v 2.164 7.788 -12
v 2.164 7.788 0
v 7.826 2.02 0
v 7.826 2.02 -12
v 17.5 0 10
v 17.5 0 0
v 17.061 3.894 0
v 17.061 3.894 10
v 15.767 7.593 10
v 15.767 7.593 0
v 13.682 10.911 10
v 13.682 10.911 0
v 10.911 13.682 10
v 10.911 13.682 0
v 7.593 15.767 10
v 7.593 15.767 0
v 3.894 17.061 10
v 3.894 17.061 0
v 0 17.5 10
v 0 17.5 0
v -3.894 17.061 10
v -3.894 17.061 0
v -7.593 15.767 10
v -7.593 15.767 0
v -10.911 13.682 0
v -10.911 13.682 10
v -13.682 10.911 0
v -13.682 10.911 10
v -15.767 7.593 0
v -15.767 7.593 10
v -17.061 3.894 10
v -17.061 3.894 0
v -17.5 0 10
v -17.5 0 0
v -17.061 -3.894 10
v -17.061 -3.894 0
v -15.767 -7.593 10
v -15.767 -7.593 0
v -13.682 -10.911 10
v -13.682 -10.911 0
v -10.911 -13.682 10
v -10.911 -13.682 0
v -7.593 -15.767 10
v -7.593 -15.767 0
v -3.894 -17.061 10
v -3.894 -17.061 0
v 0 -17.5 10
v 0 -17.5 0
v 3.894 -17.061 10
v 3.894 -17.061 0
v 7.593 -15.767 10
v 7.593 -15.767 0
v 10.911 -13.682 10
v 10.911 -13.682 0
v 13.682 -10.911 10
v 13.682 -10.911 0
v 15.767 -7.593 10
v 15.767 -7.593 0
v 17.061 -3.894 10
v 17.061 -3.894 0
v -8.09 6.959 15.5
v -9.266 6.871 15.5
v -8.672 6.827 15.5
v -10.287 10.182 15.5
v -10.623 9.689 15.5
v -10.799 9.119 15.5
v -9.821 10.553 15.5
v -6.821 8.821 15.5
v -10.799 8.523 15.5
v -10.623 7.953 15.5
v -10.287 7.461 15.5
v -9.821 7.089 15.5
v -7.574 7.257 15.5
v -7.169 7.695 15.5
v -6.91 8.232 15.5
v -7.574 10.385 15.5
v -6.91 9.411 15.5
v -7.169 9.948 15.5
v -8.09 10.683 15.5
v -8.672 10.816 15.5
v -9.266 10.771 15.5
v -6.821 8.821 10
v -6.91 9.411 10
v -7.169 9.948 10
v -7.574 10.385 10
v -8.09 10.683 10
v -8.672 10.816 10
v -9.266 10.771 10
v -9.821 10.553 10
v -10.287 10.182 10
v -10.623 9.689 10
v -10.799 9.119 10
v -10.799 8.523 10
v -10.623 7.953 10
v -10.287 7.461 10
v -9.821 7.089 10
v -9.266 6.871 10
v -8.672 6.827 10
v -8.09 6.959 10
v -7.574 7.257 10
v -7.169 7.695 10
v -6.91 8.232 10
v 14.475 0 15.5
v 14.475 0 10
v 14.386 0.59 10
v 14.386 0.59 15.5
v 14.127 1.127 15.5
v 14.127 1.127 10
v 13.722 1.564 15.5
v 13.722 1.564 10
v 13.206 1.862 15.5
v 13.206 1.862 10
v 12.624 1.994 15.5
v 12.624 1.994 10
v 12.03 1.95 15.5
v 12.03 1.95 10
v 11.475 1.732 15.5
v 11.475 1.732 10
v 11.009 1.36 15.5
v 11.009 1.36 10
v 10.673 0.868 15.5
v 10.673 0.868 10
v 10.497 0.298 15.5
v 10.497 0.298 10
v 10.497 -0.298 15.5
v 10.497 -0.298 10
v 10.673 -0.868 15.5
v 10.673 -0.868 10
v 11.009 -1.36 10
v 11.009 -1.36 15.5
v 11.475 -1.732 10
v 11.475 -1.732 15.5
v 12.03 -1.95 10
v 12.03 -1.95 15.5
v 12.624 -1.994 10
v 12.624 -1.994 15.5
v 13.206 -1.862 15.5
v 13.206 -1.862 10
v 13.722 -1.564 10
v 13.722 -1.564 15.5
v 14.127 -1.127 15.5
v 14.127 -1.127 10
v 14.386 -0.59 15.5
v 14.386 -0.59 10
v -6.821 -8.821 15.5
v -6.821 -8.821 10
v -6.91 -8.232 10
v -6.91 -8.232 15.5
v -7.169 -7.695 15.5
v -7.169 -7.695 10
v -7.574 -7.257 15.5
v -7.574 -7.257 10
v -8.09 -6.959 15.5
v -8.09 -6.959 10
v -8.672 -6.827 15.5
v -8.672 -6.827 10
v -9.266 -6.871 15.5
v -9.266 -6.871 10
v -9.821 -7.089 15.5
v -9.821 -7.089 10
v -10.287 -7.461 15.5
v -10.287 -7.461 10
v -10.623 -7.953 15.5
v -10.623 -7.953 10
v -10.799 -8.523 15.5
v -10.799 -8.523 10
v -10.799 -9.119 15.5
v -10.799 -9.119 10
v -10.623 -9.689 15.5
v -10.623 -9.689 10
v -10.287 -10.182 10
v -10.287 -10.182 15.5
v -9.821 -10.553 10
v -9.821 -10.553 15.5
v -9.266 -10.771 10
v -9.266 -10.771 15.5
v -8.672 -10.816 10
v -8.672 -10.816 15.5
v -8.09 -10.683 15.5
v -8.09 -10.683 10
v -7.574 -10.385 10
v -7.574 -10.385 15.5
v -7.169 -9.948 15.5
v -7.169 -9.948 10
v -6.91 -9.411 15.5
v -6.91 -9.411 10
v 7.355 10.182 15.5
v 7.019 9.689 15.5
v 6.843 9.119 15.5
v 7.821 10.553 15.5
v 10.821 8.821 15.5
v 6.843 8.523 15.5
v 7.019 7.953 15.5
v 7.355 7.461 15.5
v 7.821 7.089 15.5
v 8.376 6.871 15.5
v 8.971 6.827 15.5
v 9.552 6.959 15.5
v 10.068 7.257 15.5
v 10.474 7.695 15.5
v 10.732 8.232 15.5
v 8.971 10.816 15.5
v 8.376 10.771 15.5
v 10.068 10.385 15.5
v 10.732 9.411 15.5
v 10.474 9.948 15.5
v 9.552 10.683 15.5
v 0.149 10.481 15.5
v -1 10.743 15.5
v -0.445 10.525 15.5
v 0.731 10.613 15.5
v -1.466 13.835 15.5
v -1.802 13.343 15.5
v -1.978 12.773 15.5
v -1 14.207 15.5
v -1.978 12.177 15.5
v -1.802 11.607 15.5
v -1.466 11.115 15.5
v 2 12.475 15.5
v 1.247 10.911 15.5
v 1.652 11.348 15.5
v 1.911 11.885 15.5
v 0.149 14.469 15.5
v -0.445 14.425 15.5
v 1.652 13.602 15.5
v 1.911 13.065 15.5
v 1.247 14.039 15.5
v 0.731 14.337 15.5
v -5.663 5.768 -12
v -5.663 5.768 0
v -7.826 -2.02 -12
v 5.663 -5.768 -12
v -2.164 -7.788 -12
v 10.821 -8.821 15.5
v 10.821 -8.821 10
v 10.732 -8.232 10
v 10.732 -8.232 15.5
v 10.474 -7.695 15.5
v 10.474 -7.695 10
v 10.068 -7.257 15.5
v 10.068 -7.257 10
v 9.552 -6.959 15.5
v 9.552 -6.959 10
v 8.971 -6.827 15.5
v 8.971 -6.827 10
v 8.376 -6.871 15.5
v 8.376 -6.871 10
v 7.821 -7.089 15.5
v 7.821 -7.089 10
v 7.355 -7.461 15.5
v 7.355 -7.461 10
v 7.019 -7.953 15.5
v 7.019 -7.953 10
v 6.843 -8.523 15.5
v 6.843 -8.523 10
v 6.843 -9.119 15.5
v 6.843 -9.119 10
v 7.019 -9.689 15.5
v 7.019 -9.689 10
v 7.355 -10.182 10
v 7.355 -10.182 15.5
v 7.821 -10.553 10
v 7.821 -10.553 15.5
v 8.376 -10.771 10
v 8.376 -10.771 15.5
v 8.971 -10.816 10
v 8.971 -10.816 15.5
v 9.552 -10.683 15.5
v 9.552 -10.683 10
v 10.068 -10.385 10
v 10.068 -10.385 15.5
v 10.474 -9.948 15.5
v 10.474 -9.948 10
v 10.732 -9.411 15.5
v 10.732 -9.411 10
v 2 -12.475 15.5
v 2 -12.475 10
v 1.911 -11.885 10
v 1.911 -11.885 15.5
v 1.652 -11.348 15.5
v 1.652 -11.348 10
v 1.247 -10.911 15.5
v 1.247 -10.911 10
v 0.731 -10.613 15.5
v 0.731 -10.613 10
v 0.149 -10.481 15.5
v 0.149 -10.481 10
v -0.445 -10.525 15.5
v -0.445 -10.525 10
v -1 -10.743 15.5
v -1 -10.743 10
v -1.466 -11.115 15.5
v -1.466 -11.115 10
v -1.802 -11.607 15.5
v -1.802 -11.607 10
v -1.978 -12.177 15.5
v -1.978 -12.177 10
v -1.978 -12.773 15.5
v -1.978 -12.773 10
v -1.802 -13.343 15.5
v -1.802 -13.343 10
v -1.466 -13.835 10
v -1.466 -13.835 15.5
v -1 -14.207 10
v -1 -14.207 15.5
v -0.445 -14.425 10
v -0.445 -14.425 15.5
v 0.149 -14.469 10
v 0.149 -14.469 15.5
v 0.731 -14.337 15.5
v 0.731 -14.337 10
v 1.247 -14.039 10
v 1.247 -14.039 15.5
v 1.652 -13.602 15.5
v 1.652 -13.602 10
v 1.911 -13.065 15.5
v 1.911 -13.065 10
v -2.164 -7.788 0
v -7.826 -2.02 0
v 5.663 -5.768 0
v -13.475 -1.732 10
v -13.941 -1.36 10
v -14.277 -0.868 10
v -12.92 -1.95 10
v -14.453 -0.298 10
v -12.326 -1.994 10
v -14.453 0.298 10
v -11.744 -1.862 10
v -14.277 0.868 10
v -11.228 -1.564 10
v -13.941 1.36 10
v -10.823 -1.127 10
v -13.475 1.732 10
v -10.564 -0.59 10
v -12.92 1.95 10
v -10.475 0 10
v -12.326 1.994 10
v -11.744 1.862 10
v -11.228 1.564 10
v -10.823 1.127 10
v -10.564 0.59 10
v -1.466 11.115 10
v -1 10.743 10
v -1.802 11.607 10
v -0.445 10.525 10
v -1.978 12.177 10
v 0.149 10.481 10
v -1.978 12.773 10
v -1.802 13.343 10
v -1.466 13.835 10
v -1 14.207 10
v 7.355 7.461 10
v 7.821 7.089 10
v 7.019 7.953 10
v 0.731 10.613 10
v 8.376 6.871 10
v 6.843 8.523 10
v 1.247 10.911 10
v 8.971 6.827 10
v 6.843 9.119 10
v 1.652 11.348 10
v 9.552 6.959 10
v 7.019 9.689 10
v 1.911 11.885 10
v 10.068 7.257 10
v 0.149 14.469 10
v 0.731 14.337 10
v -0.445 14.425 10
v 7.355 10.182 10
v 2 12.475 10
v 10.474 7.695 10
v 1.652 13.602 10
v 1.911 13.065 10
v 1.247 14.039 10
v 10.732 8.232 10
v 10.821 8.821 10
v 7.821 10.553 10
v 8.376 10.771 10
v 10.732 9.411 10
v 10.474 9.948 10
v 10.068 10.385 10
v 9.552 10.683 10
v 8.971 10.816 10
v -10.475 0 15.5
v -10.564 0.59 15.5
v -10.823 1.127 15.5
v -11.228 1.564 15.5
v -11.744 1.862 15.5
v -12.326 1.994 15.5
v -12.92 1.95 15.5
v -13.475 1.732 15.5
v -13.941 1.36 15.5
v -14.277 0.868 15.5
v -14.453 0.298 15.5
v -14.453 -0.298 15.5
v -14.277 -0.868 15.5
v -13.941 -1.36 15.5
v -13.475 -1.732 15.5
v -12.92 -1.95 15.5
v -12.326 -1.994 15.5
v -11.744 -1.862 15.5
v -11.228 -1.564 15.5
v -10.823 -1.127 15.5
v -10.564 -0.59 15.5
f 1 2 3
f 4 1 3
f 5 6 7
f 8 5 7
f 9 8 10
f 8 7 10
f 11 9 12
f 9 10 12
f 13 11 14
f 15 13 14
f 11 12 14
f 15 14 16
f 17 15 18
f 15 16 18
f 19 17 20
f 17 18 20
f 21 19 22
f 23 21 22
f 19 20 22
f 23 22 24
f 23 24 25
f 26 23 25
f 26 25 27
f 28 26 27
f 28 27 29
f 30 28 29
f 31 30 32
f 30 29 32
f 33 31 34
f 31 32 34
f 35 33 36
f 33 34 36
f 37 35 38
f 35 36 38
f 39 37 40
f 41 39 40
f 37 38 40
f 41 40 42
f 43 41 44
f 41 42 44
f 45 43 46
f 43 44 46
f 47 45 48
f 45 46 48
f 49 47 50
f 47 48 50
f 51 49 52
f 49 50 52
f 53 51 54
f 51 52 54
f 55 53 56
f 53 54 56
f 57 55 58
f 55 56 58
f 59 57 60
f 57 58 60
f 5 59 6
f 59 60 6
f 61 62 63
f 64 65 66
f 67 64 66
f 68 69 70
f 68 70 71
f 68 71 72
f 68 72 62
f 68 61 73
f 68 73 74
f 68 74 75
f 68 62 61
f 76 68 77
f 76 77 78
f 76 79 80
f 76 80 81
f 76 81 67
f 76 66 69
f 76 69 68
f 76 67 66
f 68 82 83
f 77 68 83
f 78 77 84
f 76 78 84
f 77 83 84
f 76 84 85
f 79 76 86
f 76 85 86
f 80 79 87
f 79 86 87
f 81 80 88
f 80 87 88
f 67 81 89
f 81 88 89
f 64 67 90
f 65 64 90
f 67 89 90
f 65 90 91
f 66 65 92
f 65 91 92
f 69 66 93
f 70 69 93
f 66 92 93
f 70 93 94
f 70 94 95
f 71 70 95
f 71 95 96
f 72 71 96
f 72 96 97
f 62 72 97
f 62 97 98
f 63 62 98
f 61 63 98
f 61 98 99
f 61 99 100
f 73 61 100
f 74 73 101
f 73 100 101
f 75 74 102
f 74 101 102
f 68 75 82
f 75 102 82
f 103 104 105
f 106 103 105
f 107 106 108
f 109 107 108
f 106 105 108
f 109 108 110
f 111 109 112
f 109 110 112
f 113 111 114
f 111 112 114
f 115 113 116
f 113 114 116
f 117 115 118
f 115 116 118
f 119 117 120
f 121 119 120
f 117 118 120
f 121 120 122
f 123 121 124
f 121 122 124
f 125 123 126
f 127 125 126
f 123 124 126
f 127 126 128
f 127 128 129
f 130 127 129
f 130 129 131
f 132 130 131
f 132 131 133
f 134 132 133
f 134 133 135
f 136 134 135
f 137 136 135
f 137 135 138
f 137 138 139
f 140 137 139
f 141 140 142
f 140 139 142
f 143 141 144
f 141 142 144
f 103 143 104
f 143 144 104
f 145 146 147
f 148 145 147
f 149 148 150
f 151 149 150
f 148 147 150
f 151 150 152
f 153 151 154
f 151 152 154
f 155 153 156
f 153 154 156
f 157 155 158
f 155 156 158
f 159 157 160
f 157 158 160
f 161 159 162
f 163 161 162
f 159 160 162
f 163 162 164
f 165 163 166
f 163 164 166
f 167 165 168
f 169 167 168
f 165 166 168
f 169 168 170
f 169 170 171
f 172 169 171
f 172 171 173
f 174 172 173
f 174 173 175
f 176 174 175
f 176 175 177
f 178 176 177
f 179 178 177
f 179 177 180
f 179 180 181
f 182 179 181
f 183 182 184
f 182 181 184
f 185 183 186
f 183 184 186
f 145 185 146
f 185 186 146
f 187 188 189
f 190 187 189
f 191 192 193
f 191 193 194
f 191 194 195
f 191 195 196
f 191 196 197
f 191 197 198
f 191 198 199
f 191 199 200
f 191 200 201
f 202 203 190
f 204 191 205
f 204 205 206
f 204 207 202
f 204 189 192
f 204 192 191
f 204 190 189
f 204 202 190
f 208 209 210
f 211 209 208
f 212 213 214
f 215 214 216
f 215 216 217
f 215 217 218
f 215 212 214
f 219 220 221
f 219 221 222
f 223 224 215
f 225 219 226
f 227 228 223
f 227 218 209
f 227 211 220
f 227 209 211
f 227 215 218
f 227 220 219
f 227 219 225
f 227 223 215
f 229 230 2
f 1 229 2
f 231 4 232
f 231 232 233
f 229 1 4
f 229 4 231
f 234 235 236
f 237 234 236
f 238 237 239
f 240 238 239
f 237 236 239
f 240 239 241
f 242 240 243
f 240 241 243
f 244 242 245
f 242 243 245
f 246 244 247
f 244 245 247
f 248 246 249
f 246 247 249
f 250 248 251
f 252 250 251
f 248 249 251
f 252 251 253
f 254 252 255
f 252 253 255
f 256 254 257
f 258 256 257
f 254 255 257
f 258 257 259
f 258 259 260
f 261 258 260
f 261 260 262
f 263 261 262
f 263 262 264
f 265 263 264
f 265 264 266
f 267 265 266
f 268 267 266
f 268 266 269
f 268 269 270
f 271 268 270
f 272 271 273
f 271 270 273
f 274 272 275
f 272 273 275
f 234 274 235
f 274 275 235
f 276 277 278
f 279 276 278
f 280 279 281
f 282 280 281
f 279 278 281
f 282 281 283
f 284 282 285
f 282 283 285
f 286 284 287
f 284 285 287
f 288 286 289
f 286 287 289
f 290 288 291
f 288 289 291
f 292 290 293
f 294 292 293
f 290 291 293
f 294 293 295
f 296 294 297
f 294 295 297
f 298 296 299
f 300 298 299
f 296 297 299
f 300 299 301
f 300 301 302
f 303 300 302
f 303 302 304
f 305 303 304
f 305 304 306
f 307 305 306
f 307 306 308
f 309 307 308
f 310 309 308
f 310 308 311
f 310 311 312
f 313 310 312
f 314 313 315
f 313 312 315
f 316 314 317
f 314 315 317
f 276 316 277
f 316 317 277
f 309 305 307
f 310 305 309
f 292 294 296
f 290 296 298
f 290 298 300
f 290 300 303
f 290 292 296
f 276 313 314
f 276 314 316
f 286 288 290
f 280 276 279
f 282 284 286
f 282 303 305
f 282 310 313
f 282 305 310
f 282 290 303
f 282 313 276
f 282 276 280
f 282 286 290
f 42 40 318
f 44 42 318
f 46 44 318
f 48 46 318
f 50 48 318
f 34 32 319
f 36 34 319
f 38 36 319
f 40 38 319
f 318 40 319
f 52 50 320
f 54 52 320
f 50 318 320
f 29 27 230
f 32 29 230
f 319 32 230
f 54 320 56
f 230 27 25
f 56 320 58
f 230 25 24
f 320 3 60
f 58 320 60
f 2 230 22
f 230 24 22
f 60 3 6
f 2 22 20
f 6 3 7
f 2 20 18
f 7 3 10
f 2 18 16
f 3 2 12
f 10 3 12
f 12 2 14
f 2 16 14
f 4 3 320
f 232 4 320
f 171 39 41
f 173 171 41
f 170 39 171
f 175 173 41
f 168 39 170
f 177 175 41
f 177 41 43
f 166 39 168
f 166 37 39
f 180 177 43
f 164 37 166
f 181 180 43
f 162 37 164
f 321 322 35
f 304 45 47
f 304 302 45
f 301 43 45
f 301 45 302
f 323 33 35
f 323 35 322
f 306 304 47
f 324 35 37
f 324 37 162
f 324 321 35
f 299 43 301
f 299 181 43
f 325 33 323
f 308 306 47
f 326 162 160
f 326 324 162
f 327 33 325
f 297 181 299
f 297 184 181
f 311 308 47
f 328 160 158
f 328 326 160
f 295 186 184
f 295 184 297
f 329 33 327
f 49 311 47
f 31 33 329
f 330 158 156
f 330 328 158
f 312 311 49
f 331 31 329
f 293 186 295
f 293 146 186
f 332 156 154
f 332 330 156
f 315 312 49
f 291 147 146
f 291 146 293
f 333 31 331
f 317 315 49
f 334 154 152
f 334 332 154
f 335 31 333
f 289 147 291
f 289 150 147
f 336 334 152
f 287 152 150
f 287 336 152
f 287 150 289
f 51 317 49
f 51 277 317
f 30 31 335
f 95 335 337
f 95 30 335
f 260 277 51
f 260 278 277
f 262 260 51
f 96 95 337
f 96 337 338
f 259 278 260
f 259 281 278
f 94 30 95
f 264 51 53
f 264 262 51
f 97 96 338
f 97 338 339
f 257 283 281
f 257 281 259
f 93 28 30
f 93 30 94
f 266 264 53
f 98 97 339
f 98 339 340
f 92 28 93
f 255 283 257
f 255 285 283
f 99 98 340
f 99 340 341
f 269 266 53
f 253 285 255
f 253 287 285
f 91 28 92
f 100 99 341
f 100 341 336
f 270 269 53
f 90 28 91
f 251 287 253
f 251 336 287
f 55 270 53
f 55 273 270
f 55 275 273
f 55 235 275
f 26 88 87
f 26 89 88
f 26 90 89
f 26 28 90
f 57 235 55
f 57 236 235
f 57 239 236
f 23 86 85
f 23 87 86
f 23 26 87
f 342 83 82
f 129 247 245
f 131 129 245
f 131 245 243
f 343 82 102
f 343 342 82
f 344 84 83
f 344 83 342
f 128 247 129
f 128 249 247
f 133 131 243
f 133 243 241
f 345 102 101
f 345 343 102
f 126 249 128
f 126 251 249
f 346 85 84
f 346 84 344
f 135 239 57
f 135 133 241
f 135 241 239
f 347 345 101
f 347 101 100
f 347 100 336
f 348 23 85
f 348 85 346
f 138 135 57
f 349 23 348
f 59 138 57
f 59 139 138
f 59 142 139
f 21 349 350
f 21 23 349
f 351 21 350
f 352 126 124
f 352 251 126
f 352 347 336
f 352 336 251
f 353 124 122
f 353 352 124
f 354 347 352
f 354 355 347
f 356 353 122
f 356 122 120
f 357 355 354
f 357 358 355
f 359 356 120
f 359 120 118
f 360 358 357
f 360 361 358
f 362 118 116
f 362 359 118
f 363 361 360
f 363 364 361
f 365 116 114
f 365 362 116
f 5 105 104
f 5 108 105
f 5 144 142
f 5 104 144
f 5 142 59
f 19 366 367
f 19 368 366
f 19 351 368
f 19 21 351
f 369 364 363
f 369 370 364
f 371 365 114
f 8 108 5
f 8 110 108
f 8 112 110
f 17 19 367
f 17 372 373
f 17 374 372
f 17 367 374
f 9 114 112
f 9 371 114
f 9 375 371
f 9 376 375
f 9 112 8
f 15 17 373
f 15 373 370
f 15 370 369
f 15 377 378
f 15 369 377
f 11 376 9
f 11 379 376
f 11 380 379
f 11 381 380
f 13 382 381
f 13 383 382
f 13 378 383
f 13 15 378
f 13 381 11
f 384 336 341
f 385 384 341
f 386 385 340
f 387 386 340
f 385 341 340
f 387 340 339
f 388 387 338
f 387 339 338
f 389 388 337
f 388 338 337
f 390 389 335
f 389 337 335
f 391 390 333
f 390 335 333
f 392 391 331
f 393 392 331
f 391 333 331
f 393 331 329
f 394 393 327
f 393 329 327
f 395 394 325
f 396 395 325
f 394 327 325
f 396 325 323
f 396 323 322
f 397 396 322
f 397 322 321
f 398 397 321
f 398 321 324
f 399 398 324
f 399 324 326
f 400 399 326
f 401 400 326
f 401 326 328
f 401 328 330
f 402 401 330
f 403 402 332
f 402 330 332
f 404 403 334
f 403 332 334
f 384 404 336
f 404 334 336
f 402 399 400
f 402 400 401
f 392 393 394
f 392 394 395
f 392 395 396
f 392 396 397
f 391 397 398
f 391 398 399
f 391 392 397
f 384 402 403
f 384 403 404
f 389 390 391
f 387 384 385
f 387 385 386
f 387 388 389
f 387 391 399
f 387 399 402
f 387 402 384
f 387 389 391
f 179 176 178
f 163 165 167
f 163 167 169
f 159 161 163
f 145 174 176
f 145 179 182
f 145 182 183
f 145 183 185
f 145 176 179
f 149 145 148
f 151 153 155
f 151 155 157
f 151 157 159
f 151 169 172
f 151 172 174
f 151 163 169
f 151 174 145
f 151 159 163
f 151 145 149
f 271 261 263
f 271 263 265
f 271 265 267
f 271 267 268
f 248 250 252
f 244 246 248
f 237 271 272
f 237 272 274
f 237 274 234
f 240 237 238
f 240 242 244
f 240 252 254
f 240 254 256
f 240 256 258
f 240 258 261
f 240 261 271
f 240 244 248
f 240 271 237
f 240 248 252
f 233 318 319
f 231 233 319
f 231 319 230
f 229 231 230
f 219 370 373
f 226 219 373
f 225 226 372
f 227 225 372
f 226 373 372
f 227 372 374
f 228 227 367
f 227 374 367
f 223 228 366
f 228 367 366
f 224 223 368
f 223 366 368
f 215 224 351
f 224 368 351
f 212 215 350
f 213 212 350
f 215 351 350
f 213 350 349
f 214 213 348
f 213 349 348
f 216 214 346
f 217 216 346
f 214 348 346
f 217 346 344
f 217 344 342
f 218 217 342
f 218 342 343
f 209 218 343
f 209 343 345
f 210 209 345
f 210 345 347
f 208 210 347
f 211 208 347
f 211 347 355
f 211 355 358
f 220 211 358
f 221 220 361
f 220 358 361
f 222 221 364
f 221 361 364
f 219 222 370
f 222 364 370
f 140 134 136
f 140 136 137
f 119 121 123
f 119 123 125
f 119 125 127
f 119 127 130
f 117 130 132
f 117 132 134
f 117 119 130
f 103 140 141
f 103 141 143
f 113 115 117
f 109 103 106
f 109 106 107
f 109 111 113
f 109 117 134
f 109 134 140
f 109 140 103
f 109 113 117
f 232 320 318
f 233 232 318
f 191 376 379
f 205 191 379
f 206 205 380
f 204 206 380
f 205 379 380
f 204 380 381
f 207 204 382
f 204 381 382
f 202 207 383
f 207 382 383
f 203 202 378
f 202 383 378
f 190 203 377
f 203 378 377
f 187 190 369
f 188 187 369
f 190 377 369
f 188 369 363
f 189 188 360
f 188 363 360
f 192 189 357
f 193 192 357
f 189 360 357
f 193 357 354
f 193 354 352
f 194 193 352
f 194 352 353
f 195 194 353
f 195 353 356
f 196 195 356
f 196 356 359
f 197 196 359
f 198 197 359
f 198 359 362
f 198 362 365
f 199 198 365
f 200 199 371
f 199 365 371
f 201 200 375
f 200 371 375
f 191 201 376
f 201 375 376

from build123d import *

# Parameters (mm, degrees)
ESQUISSE1_R        = 17.5
BOSS_EXTRU_1_DEPTH = 10
ESQUISSE2_R        = 2
BOSS_EXTRU_2_DEPTH = 5.5
BOSS_EXTRU_3_DEPTH = 12


with BuildPart() as part:
    # Esquisse1 → Boss.-Extru.1 (new body)
    with BuildSketch(Plane.XY):
        Circle(ESQUISSE1_R)
    extrude(amount=BOSS_EXTRU_1_DEPTH)

    # Esquisse2 → Boss.-Extru.2 (add)
    with BuildSketch(Plane.XY.offset(10)):
        with Locations((8.821157095, 8.821157095)):
            Circle(ESQUISSE2_R)
        with Locations((0, 12.475)):
            Circle(ESQUISSE2_R)
        with Locations((12.475, 0)):
            Circle(ESQUISSE2_R)
        with Locations((8.821157095, -8.821157095)):
            Circle(ESQUISSE2_R)
        with Locations((0, -12.475)):
            Circle(ESQUISSE2_R)
        with Locations((-8.821157095, -8.821157095)):
            Circle(ESQUISSE2_R)
        with Locations((-12.475, 0)):
            Circle(ESQUISSE2_R)
        with Locations((-8.821157095, 8.821157095)):
            Circle(ESQUISSE2_R)
    extrude(amount=BOSS_EXTRU_2_DEPTH)

    # Esquisse3 → Boss.-Extru.3 (add)
    with BuildSketch(Plane(origin=(0, 0, 0), x_dir=(-1, 0, 0), z_dir=(0, 0, -1))):
        Polygon((5.662793102, 5.767677835), (-2.163558975, 7.787961601), (-7.826352077, 2.020283765), (-5.662793102, -5.767677835), (2.163558975, -7.787961601), (7.826352077, -2.020283765), align=None)
    extrude(amount=BOSS_EXTRU_3_DEPTH)


solid = part.part
